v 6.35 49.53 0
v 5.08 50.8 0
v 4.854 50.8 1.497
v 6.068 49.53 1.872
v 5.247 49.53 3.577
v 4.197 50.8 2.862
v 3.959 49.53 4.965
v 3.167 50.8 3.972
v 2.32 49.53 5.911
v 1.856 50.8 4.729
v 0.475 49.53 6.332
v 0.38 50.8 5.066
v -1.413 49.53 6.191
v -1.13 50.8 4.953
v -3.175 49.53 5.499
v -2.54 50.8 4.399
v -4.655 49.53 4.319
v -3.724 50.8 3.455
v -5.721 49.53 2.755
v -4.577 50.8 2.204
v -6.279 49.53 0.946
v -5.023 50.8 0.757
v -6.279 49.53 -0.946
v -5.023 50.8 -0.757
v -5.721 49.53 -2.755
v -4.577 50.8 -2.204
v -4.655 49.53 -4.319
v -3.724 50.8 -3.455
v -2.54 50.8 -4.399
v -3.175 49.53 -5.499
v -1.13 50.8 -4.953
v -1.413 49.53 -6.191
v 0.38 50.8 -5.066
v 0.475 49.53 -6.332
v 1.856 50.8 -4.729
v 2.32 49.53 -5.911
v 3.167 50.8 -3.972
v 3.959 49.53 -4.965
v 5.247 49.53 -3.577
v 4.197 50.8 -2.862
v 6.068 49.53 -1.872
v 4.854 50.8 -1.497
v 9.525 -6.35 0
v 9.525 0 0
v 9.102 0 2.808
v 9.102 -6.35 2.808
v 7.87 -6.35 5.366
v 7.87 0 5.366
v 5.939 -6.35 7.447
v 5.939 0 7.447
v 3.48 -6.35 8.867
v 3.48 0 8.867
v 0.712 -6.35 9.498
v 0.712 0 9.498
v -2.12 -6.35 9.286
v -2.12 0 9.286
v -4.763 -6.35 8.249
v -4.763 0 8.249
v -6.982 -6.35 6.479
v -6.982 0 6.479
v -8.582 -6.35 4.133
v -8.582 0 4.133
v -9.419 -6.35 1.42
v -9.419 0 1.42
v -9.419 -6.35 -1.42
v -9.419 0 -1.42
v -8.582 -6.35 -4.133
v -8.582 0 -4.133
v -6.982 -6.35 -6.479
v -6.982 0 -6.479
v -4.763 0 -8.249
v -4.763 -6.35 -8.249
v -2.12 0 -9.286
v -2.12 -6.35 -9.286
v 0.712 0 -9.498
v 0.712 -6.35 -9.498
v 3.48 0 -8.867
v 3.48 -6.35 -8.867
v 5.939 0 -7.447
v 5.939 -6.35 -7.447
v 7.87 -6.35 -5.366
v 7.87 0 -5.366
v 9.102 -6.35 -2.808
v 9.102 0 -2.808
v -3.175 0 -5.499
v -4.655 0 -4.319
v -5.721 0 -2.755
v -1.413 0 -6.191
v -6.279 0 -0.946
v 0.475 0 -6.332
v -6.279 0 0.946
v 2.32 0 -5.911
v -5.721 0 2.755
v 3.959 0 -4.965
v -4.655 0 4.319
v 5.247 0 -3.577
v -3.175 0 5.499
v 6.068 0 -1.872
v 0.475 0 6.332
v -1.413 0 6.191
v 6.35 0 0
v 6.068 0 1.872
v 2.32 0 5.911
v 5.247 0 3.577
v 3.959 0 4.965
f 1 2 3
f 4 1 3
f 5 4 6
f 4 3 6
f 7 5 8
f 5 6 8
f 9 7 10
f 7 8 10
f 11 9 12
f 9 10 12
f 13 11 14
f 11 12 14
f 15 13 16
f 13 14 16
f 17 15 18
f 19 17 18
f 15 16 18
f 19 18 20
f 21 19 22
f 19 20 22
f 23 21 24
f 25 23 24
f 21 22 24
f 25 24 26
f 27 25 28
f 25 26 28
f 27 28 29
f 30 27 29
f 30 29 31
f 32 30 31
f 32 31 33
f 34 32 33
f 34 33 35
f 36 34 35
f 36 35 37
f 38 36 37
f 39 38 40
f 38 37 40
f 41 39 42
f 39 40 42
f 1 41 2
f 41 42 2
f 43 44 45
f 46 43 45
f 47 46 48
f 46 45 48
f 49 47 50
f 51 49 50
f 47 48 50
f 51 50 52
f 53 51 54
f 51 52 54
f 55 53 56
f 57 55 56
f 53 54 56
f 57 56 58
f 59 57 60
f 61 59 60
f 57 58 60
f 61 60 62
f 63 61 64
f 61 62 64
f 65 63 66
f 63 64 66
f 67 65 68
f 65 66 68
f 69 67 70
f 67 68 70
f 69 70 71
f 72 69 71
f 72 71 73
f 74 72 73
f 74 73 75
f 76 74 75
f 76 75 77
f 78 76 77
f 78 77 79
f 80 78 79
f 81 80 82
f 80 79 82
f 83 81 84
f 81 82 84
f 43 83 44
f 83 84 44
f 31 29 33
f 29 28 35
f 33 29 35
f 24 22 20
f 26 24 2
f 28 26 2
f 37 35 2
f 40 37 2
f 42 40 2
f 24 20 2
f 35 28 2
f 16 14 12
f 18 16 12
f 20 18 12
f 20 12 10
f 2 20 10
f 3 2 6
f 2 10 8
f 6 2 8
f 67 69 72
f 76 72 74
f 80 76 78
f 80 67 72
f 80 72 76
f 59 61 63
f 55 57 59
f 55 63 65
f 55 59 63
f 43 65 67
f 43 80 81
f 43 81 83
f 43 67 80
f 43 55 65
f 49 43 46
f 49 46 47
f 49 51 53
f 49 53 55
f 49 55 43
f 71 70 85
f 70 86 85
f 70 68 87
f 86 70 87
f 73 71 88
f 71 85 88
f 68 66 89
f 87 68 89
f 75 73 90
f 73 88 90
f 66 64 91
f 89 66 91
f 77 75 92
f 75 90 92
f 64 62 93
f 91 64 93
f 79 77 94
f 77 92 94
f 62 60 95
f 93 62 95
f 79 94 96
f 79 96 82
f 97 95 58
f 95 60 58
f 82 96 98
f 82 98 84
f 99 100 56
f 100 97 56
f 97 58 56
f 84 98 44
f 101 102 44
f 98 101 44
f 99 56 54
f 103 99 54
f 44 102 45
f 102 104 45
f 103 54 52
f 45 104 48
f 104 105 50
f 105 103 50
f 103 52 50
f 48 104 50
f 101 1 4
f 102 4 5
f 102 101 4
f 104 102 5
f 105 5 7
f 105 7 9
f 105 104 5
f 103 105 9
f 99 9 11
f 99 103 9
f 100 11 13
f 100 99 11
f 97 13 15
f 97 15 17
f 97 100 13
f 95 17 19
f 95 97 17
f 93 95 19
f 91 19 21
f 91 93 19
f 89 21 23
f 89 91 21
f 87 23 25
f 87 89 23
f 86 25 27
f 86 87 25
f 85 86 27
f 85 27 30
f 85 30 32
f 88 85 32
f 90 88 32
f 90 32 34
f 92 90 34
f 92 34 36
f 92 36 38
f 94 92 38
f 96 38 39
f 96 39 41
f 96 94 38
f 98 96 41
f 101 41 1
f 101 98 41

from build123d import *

# Parameters (mm, degrees)
F2_R     = 9.525
F3_DEPTH = 6.35
F4_R     = 6.35
F5_DEPTH = 50.8
F6_SIZE  = 1.27


with BuildPart() as f3:
    # F2 (on Front) → F3 (new body)
    with BuildSketch(Plane.XZ):
        Circle(F2_R)
    extrude(amount=F3_DEPTH)

    # F4 (on Front) → F5 (join)
    with BuildSketch(Plane.XZ):
        Circle(F4_R)
    extrude(amount=-F5_DEPTH)

    # F6
    f6_edges = [f3.edges().sort_by_distance(p)[0] for p in [
        (-6.35, 50.8, 0),
    ]]
    chamfer(f6_edges, length=F6_SIZE)


solid = f3.part
